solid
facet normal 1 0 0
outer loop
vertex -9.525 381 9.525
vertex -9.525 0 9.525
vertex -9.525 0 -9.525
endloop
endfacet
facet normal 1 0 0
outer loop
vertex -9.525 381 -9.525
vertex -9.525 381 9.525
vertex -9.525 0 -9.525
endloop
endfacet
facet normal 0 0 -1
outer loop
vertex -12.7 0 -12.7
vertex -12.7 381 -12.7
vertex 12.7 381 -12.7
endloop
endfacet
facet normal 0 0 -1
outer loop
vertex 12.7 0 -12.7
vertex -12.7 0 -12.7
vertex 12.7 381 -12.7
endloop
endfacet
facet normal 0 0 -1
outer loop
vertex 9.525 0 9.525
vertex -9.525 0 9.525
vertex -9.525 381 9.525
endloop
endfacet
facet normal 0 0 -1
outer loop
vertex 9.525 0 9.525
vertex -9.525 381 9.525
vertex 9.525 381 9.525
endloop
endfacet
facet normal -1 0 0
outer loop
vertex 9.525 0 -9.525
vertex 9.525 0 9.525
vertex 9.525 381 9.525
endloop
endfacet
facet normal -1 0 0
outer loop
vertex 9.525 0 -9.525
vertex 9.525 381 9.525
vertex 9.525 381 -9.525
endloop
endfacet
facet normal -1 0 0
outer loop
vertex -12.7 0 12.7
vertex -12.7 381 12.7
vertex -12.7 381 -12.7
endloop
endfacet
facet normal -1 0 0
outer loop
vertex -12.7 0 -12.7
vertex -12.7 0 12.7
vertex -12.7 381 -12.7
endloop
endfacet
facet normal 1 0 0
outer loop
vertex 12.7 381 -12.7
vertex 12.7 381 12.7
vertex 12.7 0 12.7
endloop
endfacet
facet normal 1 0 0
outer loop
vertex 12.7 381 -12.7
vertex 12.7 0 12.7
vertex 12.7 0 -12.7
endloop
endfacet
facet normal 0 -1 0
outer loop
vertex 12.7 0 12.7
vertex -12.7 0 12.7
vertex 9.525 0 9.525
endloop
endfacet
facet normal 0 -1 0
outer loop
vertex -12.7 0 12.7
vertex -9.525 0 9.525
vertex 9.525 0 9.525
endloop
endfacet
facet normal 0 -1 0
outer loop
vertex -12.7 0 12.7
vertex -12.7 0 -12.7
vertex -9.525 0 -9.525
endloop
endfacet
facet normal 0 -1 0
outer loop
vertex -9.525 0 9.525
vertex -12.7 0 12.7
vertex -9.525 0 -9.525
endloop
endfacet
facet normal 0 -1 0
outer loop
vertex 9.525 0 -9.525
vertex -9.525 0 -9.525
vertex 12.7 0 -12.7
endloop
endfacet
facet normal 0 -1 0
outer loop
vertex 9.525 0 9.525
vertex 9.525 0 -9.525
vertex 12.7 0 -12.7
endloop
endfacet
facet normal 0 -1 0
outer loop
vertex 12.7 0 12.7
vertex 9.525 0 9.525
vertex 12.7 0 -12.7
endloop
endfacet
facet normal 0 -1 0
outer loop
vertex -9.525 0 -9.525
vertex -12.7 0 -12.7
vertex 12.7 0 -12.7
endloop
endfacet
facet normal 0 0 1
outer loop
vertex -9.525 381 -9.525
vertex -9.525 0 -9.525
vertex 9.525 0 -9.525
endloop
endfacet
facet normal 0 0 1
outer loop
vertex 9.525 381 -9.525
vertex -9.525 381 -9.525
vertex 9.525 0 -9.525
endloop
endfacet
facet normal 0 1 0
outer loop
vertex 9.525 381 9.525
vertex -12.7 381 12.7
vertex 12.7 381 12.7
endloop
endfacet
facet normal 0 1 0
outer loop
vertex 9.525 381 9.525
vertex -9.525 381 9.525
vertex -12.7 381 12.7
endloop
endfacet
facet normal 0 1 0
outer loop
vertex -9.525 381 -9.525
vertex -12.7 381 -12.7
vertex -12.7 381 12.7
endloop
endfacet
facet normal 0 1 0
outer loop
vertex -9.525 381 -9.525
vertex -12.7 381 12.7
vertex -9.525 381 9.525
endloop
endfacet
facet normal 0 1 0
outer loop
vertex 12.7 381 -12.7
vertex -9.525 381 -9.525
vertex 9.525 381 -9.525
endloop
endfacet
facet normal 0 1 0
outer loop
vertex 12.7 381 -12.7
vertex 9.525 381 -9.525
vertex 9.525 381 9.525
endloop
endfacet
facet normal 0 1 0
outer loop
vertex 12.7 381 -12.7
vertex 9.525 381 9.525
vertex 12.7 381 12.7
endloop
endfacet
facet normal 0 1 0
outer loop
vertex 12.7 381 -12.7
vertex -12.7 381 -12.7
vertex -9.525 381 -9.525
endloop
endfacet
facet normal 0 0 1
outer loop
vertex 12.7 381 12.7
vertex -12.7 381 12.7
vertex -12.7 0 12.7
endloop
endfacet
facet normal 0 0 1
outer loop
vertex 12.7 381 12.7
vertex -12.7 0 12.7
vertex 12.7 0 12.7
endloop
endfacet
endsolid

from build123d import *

# Parameters (mm, degrees)
SKETCH1_W               = 25.4
SKETCH1_H               = 25.4
BOSS_EXTRUDE1_DEPTH     = 381
SKETCH2_W               = 19.05
SKETCH2_H               = 19.05
CUT_EXTRUDE1_DEPTH      = 1
CUT_EXTRUDE1_DEPTH_BACK = 382


with BuildPart() as part:
    # Sketch1 → Boss-Extrude1 (new body)
    with BuildSketch(Plane(origin=(0, 0, 0), x_dir=(1, 0, 0), z_dir=(0, 1, 0))):
        Rectangle(SKETCH1_W, SKETCH1_H)
    extrude(amount=BOSS_EXTRUDE1_DEPTH)

    # Sketch2 → Cut-Extrude1 (cut, two sides)
    with BuildSketch(Plane(origin=(0, 381, 0), x_dir=(1, 0, 0), z_dir=(0, 1, 0))) as cut_extrude1_sk:
        Rectangle(SKETCH2_W, SKETCH2_H)
    extrude(amount=CUT_EXTRUDE1_DEPTH, mode=Mode.SUBTRACT)
    extrude(cut_extrude1_sk.sketch, amount=-CUT_EXTRUDE1_DEPTH_BACK, mode=Mode.SUBTRACT)


solid = part.part
